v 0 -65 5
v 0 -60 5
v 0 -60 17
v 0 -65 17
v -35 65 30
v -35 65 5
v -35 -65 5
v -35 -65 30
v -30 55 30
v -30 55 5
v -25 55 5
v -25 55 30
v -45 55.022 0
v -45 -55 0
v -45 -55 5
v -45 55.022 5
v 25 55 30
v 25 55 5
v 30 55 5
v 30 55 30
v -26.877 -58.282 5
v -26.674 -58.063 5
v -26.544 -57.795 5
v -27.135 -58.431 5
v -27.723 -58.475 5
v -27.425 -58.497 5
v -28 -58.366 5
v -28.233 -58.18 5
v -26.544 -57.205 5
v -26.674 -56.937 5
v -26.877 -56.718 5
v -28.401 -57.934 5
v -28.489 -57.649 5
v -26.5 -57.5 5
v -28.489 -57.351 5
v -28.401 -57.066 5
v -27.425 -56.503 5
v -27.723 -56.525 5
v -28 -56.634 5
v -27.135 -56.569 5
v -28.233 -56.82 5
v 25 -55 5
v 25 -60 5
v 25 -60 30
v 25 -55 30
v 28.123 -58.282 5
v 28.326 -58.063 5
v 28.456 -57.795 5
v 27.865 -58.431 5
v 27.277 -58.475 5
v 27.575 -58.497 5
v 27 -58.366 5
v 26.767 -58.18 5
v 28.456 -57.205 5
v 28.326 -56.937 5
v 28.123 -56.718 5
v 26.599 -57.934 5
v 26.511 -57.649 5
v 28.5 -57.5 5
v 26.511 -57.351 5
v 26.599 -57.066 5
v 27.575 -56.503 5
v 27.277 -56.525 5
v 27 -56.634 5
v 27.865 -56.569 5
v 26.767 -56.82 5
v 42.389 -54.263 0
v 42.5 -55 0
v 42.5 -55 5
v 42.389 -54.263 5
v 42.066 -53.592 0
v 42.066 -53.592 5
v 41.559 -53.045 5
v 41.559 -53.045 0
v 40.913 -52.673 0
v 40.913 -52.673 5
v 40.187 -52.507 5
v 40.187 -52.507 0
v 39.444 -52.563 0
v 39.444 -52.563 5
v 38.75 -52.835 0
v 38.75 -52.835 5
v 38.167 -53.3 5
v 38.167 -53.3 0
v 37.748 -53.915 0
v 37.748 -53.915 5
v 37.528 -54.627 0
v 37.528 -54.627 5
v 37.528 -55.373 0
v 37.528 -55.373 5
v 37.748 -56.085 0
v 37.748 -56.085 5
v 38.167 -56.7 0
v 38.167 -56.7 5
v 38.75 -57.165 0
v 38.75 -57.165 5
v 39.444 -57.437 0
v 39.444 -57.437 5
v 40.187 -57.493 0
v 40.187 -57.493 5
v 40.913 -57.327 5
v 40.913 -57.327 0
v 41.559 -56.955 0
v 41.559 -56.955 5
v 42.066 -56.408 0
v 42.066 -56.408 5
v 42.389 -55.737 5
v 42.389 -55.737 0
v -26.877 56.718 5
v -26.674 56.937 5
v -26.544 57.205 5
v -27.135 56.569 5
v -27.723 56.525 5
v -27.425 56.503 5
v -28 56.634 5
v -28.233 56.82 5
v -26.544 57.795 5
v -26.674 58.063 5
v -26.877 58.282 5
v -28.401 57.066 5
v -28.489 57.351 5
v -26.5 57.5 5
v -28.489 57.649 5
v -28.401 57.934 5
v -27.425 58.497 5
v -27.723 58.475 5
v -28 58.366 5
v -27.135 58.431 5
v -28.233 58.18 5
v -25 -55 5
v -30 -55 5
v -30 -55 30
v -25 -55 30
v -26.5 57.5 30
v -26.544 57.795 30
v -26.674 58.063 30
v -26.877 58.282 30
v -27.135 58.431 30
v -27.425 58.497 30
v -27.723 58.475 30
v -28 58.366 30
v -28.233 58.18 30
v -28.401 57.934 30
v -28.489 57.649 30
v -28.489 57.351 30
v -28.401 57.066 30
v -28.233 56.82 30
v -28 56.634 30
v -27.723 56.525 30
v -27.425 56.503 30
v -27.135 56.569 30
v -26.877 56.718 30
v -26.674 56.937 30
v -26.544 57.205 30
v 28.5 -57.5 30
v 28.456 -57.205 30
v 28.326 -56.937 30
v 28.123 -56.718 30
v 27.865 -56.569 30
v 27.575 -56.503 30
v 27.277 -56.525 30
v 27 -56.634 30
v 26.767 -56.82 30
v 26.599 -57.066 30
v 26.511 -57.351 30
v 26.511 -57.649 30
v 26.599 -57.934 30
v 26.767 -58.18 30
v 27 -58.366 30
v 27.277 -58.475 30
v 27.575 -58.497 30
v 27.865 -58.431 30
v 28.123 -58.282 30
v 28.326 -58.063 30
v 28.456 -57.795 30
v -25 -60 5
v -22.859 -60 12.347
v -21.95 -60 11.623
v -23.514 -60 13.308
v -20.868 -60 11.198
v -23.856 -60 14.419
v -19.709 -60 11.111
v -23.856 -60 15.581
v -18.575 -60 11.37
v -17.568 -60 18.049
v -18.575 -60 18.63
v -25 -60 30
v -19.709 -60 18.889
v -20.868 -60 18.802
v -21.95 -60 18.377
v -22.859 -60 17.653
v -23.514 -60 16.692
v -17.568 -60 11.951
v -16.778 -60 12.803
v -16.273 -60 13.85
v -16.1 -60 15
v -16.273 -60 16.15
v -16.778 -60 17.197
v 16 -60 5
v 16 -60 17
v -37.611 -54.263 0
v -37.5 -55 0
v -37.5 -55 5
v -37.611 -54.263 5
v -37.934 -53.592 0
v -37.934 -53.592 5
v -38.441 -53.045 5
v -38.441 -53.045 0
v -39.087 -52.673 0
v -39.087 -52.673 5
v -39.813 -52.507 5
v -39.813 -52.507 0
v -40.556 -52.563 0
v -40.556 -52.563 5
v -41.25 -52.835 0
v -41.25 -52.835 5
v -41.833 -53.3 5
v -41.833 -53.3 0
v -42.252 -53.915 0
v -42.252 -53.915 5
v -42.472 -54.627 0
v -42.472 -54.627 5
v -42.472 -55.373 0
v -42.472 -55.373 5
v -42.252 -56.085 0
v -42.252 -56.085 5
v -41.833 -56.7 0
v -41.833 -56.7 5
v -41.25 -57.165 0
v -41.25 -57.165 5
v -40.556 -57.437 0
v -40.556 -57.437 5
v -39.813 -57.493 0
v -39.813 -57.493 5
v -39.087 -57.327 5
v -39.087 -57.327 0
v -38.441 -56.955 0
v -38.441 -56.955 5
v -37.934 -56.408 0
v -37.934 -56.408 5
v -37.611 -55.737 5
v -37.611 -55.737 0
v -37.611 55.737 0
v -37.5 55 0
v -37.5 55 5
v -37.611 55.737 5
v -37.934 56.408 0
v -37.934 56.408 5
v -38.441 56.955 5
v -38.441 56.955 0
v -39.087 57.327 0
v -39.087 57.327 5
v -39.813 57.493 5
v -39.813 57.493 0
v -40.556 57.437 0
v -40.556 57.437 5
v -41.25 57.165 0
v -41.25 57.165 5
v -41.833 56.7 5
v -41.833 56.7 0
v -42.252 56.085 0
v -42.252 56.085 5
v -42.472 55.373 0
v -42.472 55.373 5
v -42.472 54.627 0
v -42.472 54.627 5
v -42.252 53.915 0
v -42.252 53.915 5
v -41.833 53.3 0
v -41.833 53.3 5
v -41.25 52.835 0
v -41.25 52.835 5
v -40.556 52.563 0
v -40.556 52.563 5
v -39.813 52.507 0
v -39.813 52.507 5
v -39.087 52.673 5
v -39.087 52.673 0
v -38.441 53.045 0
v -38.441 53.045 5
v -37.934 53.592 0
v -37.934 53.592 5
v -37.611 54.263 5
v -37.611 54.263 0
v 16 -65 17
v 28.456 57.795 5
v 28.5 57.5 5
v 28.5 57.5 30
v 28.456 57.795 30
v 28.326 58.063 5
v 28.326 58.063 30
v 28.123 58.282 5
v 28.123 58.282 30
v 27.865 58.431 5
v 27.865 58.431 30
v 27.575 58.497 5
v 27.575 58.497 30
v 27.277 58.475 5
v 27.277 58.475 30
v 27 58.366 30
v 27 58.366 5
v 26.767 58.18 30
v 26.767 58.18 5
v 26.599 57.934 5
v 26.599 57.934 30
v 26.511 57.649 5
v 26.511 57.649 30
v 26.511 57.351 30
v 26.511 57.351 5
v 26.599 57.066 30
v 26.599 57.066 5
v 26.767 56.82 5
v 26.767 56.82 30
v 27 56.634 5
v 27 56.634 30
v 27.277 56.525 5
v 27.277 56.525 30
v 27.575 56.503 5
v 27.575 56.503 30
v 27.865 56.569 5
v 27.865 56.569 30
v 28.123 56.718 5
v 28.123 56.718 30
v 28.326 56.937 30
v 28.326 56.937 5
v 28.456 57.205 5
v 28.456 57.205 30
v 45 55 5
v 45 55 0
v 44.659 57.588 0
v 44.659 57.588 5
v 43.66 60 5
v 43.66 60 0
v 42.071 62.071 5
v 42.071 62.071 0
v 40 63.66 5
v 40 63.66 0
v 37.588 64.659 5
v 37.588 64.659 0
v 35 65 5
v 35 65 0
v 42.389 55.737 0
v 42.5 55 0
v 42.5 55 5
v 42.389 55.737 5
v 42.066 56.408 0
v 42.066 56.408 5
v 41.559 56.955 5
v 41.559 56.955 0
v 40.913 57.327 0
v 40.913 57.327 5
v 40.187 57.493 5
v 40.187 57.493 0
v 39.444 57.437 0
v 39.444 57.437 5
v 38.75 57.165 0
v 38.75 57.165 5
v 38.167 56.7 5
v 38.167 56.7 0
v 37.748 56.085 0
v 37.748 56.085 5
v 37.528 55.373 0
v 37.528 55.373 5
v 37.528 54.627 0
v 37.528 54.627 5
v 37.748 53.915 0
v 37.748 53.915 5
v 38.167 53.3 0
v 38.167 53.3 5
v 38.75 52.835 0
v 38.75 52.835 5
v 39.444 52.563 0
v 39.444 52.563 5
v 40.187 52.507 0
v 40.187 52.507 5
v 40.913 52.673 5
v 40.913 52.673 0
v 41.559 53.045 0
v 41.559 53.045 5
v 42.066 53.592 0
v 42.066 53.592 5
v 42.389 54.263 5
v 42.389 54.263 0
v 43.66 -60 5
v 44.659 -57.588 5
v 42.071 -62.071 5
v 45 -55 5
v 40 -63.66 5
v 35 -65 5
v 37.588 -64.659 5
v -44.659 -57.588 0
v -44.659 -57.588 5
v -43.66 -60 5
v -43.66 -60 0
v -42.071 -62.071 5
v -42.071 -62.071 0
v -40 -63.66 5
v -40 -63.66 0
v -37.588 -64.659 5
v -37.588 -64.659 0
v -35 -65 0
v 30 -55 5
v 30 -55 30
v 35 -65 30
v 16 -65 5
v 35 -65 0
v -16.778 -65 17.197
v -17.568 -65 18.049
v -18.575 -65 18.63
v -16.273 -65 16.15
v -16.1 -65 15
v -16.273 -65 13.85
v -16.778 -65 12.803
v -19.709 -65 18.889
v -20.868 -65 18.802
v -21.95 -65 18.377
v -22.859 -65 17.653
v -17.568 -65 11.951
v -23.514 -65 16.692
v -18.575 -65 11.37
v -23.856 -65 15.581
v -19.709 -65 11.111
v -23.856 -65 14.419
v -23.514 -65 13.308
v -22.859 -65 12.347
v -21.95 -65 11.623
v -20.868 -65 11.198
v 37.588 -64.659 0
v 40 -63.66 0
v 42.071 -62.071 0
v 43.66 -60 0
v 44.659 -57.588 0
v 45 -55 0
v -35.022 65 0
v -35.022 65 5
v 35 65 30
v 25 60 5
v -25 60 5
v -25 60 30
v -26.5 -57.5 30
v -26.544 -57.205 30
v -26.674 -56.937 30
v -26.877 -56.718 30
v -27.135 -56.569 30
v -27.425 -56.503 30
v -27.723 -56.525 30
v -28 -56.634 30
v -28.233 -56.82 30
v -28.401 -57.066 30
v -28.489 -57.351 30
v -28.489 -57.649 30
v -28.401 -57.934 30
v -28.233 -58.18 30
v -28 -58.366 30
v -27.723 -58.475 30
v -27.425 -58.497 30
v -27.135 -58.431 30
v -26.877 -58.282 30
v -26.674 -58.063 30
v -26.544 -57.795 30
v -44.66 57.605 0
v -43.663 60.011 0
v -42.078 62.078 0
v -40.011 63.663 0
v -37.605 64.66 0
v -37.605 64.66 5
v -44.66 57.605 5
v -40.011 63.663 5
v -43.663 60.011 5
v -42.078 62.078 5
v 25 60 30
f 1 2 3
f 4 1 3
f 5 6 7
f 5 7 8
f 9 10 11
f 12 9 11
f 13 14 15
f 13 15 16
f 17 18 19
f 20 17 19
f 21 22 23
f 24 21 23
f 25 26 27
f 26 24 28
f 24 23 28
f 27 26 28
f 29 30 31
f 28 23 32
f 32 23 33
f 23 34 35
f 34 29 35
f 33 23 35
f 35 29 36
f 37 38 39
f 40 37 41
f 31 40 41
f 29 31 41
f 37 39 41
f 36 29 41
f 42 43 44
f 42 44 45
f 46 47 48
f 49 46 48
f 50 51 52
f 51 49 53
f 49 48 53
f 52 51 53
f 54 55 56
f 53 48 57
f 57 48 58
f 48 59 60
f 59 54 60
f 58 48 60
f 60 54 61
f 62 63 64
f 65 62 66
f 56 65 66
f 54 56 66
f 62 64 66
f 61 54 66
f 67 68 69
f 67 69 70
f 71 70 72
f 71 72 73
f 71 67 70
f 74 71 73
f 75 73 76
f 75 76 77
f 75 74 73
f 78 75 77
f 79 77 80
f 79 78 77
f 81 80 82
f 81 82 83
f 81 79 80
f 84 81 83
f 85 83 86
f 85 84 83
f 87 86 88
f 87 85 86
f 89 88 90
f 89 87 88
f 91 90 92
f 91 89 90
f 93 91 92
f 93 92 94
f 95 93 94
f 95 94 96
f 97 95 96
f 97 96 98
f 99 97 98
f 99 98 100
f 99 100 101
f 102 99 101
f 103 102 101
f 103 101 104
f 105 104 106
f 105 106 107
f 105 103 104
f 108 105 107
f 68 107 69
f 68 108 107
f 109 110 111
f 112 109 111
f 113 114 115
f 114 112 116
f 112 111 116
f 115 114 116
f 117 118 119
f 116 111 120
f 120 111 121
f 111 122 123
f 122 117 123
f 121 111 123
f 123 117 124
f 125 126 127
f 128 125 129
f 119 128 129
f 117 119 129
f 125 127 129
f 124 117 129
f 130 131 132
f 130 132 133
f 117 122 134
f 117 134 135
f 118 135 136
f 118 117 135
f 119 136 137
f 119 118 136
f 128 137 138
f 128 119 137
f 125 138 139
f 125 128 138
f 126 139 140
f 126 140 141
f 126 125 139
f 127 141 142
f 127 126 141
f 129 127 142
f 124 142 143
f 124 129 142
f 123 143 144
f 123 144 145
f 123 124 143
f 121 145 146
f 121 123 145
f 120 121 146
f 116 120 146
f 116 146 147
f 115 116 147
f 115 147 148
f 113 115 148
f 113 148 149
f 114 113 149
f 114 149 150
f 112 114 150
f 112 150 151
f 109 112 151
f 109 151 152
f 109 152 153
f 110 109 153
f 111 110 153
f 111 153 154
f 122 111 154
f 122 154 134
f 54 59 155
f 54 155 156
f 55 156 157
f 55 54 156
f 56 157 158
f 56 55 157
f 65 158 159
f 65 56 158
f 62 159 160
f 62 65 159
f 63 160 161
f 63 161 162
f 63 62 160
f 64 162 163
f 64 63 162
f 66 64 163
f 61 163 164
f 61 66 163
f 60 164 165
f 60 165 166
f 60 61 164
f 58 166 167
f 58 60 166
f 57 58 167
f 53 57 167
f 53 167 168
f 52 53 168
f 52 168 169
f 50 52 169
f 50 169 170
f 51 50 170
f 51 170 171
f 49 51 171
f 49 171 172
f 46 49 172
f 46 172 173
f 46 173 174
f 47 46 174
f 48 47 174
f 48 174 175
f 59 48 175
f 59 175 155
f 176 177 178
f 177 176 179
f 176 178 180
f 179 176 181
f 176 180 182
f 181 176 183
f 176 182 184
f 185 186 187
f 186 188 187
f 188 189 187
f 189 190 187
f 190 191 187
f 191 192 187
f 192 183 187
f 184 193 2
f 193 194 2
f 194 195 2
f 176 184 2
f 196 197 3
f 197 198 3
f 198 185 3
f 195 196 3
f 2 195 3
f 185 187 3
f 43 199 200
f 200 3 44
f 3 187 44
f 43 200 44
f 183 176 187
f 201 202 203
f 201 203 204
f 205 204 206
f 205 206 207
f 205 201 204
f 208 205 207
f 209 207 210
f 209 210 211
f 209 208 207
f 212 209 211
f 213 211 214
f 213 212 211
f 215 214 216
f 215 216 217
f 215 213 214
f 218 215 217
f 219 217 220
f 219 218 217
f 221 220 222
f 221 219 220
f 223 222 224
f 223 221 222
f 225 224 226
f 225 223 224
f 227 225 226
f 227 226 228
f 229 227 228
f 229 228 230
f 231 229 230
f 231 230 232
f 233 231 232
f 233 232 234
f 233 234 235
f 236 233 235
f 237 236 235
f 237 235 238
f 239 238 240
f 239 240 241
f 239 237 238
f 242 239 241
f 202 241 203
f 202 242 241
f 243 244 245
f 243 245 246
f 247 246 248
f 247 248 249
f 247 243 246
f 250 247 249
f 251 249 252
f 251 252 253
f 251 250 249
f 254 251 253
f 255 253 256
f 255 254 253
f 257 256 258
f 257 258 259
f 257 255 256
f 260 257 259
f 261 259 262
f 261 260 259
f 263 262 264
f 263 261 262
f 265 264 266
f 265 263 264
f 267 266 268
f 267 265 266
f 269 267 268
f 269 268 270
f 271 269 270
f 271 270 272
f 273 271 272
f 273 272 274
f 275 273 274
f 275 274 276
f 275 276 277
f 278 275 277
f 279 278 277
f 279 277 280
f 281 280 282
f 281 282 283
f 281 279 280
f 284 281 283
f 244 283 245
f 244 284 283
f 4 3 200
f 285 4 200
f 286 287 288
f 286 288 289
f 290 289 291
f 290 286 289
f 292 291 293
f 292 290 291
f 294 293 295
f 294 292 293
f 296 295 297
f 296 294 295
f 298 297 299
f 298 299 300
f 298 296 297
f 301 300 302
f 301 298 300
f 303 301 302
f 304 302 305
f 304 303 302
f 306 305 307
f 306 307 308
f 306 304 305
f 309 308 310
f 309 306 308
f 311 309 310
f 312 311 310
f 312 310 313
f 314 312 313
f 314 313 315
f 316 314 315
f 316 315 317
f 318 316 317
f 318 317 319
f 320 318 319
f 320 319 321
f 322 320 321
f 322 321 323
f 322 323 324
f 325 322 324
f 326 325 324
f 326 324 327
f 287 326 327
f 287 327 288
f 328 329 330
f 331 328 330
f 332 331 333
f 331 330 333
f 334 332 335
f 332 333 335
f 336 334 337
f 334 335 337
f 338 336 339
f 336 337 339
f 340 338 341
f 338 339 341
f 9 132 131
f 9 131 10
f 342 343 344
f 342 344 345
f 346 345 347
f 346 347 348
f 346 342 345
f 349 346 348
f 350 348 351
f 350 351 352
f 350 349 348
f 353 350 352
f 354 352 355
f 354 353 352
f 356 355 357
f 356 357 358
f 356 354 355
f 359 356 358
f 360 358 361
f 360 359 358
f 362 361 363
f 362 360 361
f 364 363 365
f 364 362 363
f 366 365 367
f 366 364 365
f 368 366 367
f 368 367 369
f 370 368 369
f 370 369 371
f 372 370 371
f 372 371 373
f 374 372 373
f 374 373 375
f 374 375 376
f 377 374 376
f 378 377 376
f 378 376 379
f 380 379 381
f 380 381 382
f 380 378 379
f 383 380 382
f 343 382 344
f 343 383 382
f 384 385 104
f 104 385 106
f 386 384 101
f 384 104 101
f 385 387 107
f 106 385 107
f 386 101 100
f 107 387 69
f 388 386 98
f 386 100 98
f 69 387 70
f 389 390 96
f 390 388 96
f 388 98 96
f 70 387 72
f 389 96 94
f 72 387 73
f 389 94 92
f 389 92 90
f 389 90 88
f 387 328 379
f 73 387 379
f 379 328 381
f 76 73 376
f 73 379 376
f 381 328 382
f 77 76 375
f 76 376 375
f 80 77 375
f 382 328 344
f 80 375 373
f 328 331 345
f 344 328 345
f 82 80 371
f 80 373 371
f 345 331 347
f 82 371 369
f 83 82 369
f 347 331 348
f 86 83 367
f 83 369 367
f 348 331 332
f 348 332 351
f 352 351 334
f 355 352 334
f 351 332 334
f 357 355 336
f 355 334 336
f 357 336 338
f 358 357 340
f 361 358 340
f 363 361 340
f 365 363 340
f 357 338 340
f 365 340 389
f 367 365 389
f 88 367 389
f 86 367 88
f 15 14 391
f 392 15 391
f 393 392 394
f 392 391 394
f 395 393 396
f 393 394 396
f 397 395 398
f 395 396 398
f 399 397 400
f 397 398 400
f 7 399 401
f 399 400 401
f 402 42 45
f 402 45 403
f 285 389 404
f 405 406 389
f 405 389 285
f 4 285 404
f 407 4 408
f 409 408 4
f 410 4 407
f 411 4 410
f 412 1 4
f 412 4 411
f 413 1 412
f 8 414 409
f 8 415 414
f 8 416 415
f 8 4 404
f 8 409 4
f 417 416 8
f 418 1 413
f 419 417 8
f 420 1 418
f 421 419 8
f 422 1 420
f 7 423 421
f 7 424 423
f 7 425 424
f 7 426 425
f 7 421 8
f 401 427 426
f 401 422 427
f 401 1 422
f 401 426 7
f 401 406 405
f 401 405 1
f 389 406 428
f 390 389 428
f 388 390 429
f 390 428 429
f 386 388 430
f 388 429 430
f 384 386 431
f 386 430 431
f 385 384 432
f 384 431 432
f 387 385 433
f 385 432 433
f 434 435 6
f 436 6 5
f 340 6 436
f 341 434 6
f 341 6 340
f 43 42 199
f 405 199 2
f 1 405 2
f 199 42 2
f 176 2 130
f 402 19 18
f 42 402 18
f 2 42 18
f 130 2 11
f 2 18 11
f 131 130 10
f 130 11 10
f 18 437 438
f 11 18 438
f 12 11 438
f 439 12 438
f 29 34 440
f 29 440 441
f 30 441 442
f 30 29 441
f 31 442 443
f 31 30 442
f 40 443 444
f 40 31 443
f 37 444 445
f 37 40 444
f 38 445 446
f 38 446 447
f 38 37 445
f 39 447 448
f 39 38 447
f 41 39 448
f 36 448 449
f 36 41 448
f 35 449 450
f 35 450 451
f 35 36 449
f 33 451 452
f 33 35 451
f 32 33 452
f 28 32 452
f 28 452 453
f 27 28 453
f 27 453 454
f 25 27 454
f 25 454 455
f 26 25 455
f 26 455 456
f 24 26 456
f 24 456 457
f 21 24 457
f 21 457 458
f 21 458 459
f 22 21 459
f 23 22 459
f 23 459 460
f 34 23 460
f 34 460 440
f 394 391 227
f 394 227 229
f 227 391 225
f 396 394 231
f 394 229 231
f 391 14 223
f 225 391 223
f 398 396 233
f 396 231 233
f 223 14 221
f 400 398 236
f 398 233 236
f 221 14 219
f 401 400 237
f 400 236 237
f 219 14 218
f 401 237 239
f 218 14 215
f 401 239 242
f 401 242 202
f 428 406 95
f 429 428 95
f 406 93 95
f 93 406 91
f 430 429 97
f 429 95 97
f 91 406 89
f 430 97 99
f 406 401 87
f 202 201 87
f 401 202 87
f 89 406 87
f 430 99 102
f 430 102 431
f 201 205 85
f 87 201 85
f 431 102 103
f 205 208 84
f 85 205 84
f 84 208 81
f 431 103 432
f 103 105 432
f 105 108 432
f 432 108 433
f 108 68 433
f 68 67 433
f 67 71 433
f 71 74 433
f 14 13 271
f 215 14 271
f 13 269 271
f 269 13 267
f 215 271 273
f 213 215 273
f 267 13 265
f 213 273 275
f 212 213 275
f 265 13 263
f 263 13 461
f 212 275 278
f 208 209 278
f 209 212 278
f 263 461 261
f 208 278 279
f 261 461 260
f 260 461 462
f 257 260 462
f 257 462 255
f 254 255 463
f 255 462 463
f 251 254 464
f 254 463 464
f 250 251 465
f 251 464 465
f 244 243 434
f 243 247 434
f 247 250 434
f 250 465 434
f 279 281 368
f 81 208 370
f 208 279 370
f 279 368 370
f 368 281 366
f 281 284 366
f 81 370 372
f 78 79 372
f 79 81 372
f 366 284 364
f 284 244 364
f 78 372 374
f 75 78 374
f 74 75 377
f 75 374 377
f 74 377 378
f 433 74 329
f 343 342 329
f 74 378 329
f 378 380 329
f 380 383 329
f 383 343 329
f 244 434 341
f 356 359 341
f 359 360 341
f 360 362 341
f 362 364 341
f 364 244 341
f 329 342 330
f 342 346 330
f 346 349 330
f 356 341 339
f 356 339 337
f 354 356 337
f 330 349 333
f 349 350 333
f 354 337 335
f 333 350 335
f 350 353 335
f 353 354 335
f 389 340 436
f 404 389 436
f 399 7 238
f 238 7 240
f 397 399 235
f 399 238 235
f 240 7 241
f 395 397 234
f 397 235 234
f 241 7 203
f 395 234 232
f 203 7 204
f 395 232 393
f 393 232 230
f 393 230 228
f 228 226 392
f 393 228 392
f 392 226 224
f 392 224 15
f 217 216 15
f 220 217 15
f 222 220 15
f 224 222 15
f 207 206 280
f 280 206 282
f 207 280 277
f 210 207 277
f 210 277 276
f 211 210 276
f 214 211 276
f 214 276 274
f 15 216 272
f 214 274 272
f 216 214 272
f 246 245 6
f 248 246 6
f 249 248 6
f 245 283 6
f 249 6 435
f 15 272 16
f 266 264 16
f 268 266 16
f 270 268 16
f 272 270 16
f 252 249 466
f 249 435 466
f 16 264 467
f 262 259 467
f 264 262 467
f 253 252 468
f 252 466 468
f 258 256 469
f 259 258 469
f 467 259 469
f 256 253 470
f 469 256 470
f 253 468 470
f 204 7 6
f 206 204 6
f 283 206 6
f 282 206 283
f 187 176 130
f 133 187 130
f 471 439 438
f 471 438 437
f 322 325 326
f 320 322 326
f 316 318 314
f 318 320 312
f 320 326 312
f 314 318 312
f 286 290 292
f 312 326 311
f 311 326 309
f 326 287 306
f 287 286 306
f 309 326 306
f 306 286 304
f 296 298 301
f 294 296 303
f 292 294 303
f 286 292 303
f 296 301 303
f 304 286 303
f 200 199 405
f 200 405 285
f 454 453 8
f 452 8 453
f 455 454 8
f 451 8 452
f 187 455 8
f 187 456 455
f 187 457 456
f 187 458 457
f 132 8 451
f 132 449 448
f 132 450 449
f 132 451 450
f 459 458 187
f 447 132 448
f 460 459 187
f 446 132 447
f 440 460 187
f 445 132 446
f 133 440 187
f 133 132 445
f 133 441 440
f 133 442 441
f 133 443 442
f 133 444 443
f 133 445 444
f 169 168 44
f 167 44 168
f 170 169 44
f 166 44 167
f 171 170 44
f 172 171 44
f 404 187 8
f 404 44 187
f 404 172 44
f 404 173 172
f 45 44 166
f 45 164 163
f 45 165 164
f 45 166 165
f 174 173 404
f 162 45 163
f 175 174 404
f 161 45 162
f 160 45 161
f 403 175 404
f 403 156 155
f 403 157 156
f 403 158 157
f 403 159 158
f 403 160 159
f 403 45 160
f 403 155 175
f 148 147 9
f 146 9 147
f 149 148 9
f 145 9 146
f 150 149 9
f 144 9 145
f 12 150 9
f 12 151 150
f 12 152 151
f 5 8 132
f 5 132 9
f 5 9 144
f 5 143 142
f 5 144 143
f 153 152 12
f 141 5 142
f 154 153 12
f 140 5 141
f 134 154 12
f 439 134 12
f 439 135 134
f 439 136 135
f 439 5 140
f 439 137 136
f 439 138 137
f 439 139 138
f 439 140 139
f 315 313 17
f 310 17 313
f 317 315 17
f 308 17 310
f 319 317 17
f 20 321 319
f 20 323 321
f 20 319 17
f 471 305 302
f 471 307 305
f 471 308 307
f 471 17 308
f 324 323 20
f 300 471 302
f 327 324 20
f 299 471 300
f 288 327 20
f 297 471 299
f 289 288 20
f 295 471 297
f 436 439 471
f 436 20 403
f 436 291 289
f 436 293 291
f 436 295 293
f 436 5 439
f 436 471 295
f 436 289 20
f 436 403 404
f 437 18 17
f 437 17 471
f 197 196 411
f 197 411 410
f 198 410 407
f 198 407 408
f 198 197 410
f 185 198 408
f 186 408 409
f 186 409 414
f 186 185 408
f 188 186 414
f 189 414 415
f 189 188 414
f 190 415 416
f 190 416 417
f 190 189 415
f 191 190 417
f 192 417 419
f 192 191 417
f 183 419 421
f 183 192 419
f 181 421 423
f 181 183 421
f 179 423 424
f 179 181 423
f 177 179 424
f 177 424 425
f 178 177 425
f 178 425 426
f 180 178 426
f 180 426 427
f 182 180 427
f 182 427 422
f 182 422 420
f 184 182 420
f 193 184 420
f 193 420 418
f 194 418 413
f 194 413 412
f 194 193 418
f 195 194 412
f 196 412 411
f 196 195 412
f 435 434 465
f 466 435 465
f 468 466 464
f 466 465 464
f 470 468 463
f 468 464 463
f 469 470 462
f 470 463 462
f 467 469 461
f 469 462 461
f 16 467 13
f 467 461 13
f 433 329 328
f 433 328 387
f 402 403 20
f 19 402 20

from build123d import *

# Parameters (mm, degrees)
SKETCH001_W   = 70
SKETCH001_H   = 30
SKETCH001_R   = 3.9
SKETCH001_W_2 = 16
SKETCH001_H_2 = 17
PAD001_DEPTH  = 5
SKETCH002_W   = 70
SKETCH002_H   = 30
PAD002_DEPTH  = 5
SKETCH003_W   = 120
SKETCH003_H   = 30
PAD003_DEPTH  = 5
SKETCH004_W   = 120
SKETCH004_H   = 30
PAD004_DEPTH  = 5
SKETCH005_W   = 5
SKETCH005_H   = 5
SKETCH005_R   = 1
PAD005_DEPTH  = 30
SKETCH007_W   = 5
SKETCH007_H   = 5
SKETCH007_R   = 1
PAD006_DEPTH  = 30
SKETCH008_W   = 5
SKETCH008_H   = 5
SKETCH008_R   = 1
PAD007_DEPTH  = 30
SKETCH009_W   = 5
SKETCH009_H   = 5
SKETCH009_R   = 1
PAD008_DEPTH  = 30
SKETCH_R      = 2.5
PAD_DEPTH     = 5


with BuildPart() as body001:
    # Sketch001 → Pad001 (new body)
    with BuildSketch(Plane.XZ):
        with Locations((0, 15)):
            Rectangle(SKETCH001_W, SKETCH001_H)
        with Locations((-20, 15)):
            Circle(SKETCH001_R, mode=Mode.SUBTRACT)
        with Locations((8, 8.5)):
            Rectangle(SKETCH001_W_2, SKETCH001_H_2, mode=Mode.SUBTRACT)
    extrude(amount=PAD001_DEPTH)


with BuildPart() as body001_1:
    # Body001 placement: moved
    add(body001.part.moved(Location((0, -60, 0))))


with BuildPart() as body002:
    # Sketch002 → Pad002 (new body)
    with BuildSketch(Plane.XZ):
        with Locations((-105, 15)):
            Rectangle(SKETCH002_W, SKETCH002_H)
    extrude(amount=PAD002_DEPTH)


with BuildPart() as body002_1:
    # Body002 placement: moved
    add(body002.part.moved(Location((105, 65, 0))))


with BuildPart() as body003:
    # Sketch003 → Pad003 (new body)
    with BuildSketch(Plane.YZ):
        with Locations((0, 15)):
            Rectangle(SKETCH003_W, SKETCH003_H)
    extrude(amount=PAD003_DEPTH)


with BuildPart() as body003_1:
    # Body003 placement: moved
    add(body003.part.moved(Location((30, 0, 0))))


with BuildPart() as body004:
    # Sketch004 → Pad004 (new body)
    with BuildSketch(Plane.YZ):
        with Locations((0, 15)):
            Rectangle(SKETCH004_W, SKETCH004_H)
    extrude(amount=PAD004_DEPTH)


with BuildPart() as body004_1:
    # Body004 placement: moved
    add(body004.part.moved(Location((-35, 0, 0))))


with BuildPart() as hole_in_the_right_frame:
    # Sketch005 → Pad005 (new body)
    with BuildSketch(Plane.XY):
        with Locations((27.5, 42.5)):
            Rectangle(SKETCH005_W, SKETCH005_H)
        with Locations((27.5, 42.5)):
            Circle(SKETCH005_R, mode=Mode.SUBTRACT)
    extrude(amount=PAD005_DEPTH)


with BuildPart() as hole_in_the_right_frame_1:
    # Body005 placement: moved
    add(hole_in_the_right_frame.part.moved(Location((0, 15, 0))))


with BuildPart() as hole_in_the_left_frame:
    # Sketch007 → Pad006 (new body)
    with BuildSketch(Plane.XY):
        with Locations((-27.5, 42.5)):
            Rectangle(SKETCH007_W, SKETCH007_H)
        with Locations((-27.5, 42.5)):
            Circle(SKETCH007_R, mode=Mode.SUBTRACT)
    extrude(amount=PAD006_DEPTH)


with BuildPart() as hole_in_the_left_frame_1:
    # Body006 placement: moved
    add(hole_in_the_left_frame.part.moved(Location((0, 15, 0))))


with BuildPart() as hole_in_the_left_frame1:
    # Sketch008 → Pad007 (new body)
    with BuildSketch(Plane.XY):
        with Locations((-27.5, -42.5)):
            Rectangle(SKETCH008_W, SKETCH008_H)
        with Locations((-27.5, -42.5)):
            Circle(SKETCH008_R, mode=Mode.SUBTRACT)
    extrude(amount=PAD007_DEPTH)


with BuildPart() as hole_in_the_left_frame1_1:
    # Body007 placement: moved
    add(hole_in_the_left_frame1.part.moved(Location((0, -15, 0))))


with BuildPart() as body008:
    # Sketch009 → Pad008 (new body)
    with BuildSketch(Plane.XY):
        with Locations((27.5, -42.5)):
            Rectangle(SKETCH009_W, SKETCH009_H)
        with Locations((27.5, -42.5)):
            Circle(SKETCH009_R, mode=Mode.SUBTRACT)
    extrude(amount=PAD008_DEPTH)


with BuildPart() as body008_1:
    # Body008 placement: moved
    add(body008.part.moved(Location((0, -15, 0))))


with BuildPart() as fusion:
    # Sketch → Pad (new body)
    with BuildSketch(Plane.XY):
        with BuildLine():
            Line((-35.022389, 65), (35, 65))
            ThreePointArc((45, 55), (42.071068, 62.071068), (35, 65))
            Line((45, 55), (45, -55))
            ThreePointArc((35, -65), (42.071068, -62.071068), (45, -55))
            Line((35, -65), (-35, -65))
            ThreePointArc((-45, -55), (-42.071068, -62.071068), (-35, -65))
            Line((-45, -55), (-45, 55.022389))
            ThreePointArc((-35.022389, 65), (-42.077625, 62.077625), (-45, 55.022389))
        make_face()
        with Locations((40, -55)):
            Circle(SKETCH_R, mode=Mode.SUBTRACT)
        with Locations((40, 55)):
            Circle(SKETCH_R, mode=Mode.SUBTRACT)
        with Locations((-40, -55)):
            Circle(SKETCH_R, mode=Mode.SUBTRACT)
        with Locations((-40, 55)):
            Circle(SKETCH_R, mode=Mode.SUBTRACT)
    extrude(amount=PAD_DEPTH)

    # Fusion: union Body001, Body002, Body003, Body004, Hole in the right frame, Hole in the left frame, Hole in the left frame1, Body008
    add(body001_1.part)
    add(body002_1.part)
    add(body003_1.part)
    add(body004_1.part)
    add(hole_in_the_right_frame_1.part)
    add(hole_in_the_left_frame_1.part)
    add(hole_in_the_left_frame1_1.part)
    add(body008_1.part)


solid = fusion.part
